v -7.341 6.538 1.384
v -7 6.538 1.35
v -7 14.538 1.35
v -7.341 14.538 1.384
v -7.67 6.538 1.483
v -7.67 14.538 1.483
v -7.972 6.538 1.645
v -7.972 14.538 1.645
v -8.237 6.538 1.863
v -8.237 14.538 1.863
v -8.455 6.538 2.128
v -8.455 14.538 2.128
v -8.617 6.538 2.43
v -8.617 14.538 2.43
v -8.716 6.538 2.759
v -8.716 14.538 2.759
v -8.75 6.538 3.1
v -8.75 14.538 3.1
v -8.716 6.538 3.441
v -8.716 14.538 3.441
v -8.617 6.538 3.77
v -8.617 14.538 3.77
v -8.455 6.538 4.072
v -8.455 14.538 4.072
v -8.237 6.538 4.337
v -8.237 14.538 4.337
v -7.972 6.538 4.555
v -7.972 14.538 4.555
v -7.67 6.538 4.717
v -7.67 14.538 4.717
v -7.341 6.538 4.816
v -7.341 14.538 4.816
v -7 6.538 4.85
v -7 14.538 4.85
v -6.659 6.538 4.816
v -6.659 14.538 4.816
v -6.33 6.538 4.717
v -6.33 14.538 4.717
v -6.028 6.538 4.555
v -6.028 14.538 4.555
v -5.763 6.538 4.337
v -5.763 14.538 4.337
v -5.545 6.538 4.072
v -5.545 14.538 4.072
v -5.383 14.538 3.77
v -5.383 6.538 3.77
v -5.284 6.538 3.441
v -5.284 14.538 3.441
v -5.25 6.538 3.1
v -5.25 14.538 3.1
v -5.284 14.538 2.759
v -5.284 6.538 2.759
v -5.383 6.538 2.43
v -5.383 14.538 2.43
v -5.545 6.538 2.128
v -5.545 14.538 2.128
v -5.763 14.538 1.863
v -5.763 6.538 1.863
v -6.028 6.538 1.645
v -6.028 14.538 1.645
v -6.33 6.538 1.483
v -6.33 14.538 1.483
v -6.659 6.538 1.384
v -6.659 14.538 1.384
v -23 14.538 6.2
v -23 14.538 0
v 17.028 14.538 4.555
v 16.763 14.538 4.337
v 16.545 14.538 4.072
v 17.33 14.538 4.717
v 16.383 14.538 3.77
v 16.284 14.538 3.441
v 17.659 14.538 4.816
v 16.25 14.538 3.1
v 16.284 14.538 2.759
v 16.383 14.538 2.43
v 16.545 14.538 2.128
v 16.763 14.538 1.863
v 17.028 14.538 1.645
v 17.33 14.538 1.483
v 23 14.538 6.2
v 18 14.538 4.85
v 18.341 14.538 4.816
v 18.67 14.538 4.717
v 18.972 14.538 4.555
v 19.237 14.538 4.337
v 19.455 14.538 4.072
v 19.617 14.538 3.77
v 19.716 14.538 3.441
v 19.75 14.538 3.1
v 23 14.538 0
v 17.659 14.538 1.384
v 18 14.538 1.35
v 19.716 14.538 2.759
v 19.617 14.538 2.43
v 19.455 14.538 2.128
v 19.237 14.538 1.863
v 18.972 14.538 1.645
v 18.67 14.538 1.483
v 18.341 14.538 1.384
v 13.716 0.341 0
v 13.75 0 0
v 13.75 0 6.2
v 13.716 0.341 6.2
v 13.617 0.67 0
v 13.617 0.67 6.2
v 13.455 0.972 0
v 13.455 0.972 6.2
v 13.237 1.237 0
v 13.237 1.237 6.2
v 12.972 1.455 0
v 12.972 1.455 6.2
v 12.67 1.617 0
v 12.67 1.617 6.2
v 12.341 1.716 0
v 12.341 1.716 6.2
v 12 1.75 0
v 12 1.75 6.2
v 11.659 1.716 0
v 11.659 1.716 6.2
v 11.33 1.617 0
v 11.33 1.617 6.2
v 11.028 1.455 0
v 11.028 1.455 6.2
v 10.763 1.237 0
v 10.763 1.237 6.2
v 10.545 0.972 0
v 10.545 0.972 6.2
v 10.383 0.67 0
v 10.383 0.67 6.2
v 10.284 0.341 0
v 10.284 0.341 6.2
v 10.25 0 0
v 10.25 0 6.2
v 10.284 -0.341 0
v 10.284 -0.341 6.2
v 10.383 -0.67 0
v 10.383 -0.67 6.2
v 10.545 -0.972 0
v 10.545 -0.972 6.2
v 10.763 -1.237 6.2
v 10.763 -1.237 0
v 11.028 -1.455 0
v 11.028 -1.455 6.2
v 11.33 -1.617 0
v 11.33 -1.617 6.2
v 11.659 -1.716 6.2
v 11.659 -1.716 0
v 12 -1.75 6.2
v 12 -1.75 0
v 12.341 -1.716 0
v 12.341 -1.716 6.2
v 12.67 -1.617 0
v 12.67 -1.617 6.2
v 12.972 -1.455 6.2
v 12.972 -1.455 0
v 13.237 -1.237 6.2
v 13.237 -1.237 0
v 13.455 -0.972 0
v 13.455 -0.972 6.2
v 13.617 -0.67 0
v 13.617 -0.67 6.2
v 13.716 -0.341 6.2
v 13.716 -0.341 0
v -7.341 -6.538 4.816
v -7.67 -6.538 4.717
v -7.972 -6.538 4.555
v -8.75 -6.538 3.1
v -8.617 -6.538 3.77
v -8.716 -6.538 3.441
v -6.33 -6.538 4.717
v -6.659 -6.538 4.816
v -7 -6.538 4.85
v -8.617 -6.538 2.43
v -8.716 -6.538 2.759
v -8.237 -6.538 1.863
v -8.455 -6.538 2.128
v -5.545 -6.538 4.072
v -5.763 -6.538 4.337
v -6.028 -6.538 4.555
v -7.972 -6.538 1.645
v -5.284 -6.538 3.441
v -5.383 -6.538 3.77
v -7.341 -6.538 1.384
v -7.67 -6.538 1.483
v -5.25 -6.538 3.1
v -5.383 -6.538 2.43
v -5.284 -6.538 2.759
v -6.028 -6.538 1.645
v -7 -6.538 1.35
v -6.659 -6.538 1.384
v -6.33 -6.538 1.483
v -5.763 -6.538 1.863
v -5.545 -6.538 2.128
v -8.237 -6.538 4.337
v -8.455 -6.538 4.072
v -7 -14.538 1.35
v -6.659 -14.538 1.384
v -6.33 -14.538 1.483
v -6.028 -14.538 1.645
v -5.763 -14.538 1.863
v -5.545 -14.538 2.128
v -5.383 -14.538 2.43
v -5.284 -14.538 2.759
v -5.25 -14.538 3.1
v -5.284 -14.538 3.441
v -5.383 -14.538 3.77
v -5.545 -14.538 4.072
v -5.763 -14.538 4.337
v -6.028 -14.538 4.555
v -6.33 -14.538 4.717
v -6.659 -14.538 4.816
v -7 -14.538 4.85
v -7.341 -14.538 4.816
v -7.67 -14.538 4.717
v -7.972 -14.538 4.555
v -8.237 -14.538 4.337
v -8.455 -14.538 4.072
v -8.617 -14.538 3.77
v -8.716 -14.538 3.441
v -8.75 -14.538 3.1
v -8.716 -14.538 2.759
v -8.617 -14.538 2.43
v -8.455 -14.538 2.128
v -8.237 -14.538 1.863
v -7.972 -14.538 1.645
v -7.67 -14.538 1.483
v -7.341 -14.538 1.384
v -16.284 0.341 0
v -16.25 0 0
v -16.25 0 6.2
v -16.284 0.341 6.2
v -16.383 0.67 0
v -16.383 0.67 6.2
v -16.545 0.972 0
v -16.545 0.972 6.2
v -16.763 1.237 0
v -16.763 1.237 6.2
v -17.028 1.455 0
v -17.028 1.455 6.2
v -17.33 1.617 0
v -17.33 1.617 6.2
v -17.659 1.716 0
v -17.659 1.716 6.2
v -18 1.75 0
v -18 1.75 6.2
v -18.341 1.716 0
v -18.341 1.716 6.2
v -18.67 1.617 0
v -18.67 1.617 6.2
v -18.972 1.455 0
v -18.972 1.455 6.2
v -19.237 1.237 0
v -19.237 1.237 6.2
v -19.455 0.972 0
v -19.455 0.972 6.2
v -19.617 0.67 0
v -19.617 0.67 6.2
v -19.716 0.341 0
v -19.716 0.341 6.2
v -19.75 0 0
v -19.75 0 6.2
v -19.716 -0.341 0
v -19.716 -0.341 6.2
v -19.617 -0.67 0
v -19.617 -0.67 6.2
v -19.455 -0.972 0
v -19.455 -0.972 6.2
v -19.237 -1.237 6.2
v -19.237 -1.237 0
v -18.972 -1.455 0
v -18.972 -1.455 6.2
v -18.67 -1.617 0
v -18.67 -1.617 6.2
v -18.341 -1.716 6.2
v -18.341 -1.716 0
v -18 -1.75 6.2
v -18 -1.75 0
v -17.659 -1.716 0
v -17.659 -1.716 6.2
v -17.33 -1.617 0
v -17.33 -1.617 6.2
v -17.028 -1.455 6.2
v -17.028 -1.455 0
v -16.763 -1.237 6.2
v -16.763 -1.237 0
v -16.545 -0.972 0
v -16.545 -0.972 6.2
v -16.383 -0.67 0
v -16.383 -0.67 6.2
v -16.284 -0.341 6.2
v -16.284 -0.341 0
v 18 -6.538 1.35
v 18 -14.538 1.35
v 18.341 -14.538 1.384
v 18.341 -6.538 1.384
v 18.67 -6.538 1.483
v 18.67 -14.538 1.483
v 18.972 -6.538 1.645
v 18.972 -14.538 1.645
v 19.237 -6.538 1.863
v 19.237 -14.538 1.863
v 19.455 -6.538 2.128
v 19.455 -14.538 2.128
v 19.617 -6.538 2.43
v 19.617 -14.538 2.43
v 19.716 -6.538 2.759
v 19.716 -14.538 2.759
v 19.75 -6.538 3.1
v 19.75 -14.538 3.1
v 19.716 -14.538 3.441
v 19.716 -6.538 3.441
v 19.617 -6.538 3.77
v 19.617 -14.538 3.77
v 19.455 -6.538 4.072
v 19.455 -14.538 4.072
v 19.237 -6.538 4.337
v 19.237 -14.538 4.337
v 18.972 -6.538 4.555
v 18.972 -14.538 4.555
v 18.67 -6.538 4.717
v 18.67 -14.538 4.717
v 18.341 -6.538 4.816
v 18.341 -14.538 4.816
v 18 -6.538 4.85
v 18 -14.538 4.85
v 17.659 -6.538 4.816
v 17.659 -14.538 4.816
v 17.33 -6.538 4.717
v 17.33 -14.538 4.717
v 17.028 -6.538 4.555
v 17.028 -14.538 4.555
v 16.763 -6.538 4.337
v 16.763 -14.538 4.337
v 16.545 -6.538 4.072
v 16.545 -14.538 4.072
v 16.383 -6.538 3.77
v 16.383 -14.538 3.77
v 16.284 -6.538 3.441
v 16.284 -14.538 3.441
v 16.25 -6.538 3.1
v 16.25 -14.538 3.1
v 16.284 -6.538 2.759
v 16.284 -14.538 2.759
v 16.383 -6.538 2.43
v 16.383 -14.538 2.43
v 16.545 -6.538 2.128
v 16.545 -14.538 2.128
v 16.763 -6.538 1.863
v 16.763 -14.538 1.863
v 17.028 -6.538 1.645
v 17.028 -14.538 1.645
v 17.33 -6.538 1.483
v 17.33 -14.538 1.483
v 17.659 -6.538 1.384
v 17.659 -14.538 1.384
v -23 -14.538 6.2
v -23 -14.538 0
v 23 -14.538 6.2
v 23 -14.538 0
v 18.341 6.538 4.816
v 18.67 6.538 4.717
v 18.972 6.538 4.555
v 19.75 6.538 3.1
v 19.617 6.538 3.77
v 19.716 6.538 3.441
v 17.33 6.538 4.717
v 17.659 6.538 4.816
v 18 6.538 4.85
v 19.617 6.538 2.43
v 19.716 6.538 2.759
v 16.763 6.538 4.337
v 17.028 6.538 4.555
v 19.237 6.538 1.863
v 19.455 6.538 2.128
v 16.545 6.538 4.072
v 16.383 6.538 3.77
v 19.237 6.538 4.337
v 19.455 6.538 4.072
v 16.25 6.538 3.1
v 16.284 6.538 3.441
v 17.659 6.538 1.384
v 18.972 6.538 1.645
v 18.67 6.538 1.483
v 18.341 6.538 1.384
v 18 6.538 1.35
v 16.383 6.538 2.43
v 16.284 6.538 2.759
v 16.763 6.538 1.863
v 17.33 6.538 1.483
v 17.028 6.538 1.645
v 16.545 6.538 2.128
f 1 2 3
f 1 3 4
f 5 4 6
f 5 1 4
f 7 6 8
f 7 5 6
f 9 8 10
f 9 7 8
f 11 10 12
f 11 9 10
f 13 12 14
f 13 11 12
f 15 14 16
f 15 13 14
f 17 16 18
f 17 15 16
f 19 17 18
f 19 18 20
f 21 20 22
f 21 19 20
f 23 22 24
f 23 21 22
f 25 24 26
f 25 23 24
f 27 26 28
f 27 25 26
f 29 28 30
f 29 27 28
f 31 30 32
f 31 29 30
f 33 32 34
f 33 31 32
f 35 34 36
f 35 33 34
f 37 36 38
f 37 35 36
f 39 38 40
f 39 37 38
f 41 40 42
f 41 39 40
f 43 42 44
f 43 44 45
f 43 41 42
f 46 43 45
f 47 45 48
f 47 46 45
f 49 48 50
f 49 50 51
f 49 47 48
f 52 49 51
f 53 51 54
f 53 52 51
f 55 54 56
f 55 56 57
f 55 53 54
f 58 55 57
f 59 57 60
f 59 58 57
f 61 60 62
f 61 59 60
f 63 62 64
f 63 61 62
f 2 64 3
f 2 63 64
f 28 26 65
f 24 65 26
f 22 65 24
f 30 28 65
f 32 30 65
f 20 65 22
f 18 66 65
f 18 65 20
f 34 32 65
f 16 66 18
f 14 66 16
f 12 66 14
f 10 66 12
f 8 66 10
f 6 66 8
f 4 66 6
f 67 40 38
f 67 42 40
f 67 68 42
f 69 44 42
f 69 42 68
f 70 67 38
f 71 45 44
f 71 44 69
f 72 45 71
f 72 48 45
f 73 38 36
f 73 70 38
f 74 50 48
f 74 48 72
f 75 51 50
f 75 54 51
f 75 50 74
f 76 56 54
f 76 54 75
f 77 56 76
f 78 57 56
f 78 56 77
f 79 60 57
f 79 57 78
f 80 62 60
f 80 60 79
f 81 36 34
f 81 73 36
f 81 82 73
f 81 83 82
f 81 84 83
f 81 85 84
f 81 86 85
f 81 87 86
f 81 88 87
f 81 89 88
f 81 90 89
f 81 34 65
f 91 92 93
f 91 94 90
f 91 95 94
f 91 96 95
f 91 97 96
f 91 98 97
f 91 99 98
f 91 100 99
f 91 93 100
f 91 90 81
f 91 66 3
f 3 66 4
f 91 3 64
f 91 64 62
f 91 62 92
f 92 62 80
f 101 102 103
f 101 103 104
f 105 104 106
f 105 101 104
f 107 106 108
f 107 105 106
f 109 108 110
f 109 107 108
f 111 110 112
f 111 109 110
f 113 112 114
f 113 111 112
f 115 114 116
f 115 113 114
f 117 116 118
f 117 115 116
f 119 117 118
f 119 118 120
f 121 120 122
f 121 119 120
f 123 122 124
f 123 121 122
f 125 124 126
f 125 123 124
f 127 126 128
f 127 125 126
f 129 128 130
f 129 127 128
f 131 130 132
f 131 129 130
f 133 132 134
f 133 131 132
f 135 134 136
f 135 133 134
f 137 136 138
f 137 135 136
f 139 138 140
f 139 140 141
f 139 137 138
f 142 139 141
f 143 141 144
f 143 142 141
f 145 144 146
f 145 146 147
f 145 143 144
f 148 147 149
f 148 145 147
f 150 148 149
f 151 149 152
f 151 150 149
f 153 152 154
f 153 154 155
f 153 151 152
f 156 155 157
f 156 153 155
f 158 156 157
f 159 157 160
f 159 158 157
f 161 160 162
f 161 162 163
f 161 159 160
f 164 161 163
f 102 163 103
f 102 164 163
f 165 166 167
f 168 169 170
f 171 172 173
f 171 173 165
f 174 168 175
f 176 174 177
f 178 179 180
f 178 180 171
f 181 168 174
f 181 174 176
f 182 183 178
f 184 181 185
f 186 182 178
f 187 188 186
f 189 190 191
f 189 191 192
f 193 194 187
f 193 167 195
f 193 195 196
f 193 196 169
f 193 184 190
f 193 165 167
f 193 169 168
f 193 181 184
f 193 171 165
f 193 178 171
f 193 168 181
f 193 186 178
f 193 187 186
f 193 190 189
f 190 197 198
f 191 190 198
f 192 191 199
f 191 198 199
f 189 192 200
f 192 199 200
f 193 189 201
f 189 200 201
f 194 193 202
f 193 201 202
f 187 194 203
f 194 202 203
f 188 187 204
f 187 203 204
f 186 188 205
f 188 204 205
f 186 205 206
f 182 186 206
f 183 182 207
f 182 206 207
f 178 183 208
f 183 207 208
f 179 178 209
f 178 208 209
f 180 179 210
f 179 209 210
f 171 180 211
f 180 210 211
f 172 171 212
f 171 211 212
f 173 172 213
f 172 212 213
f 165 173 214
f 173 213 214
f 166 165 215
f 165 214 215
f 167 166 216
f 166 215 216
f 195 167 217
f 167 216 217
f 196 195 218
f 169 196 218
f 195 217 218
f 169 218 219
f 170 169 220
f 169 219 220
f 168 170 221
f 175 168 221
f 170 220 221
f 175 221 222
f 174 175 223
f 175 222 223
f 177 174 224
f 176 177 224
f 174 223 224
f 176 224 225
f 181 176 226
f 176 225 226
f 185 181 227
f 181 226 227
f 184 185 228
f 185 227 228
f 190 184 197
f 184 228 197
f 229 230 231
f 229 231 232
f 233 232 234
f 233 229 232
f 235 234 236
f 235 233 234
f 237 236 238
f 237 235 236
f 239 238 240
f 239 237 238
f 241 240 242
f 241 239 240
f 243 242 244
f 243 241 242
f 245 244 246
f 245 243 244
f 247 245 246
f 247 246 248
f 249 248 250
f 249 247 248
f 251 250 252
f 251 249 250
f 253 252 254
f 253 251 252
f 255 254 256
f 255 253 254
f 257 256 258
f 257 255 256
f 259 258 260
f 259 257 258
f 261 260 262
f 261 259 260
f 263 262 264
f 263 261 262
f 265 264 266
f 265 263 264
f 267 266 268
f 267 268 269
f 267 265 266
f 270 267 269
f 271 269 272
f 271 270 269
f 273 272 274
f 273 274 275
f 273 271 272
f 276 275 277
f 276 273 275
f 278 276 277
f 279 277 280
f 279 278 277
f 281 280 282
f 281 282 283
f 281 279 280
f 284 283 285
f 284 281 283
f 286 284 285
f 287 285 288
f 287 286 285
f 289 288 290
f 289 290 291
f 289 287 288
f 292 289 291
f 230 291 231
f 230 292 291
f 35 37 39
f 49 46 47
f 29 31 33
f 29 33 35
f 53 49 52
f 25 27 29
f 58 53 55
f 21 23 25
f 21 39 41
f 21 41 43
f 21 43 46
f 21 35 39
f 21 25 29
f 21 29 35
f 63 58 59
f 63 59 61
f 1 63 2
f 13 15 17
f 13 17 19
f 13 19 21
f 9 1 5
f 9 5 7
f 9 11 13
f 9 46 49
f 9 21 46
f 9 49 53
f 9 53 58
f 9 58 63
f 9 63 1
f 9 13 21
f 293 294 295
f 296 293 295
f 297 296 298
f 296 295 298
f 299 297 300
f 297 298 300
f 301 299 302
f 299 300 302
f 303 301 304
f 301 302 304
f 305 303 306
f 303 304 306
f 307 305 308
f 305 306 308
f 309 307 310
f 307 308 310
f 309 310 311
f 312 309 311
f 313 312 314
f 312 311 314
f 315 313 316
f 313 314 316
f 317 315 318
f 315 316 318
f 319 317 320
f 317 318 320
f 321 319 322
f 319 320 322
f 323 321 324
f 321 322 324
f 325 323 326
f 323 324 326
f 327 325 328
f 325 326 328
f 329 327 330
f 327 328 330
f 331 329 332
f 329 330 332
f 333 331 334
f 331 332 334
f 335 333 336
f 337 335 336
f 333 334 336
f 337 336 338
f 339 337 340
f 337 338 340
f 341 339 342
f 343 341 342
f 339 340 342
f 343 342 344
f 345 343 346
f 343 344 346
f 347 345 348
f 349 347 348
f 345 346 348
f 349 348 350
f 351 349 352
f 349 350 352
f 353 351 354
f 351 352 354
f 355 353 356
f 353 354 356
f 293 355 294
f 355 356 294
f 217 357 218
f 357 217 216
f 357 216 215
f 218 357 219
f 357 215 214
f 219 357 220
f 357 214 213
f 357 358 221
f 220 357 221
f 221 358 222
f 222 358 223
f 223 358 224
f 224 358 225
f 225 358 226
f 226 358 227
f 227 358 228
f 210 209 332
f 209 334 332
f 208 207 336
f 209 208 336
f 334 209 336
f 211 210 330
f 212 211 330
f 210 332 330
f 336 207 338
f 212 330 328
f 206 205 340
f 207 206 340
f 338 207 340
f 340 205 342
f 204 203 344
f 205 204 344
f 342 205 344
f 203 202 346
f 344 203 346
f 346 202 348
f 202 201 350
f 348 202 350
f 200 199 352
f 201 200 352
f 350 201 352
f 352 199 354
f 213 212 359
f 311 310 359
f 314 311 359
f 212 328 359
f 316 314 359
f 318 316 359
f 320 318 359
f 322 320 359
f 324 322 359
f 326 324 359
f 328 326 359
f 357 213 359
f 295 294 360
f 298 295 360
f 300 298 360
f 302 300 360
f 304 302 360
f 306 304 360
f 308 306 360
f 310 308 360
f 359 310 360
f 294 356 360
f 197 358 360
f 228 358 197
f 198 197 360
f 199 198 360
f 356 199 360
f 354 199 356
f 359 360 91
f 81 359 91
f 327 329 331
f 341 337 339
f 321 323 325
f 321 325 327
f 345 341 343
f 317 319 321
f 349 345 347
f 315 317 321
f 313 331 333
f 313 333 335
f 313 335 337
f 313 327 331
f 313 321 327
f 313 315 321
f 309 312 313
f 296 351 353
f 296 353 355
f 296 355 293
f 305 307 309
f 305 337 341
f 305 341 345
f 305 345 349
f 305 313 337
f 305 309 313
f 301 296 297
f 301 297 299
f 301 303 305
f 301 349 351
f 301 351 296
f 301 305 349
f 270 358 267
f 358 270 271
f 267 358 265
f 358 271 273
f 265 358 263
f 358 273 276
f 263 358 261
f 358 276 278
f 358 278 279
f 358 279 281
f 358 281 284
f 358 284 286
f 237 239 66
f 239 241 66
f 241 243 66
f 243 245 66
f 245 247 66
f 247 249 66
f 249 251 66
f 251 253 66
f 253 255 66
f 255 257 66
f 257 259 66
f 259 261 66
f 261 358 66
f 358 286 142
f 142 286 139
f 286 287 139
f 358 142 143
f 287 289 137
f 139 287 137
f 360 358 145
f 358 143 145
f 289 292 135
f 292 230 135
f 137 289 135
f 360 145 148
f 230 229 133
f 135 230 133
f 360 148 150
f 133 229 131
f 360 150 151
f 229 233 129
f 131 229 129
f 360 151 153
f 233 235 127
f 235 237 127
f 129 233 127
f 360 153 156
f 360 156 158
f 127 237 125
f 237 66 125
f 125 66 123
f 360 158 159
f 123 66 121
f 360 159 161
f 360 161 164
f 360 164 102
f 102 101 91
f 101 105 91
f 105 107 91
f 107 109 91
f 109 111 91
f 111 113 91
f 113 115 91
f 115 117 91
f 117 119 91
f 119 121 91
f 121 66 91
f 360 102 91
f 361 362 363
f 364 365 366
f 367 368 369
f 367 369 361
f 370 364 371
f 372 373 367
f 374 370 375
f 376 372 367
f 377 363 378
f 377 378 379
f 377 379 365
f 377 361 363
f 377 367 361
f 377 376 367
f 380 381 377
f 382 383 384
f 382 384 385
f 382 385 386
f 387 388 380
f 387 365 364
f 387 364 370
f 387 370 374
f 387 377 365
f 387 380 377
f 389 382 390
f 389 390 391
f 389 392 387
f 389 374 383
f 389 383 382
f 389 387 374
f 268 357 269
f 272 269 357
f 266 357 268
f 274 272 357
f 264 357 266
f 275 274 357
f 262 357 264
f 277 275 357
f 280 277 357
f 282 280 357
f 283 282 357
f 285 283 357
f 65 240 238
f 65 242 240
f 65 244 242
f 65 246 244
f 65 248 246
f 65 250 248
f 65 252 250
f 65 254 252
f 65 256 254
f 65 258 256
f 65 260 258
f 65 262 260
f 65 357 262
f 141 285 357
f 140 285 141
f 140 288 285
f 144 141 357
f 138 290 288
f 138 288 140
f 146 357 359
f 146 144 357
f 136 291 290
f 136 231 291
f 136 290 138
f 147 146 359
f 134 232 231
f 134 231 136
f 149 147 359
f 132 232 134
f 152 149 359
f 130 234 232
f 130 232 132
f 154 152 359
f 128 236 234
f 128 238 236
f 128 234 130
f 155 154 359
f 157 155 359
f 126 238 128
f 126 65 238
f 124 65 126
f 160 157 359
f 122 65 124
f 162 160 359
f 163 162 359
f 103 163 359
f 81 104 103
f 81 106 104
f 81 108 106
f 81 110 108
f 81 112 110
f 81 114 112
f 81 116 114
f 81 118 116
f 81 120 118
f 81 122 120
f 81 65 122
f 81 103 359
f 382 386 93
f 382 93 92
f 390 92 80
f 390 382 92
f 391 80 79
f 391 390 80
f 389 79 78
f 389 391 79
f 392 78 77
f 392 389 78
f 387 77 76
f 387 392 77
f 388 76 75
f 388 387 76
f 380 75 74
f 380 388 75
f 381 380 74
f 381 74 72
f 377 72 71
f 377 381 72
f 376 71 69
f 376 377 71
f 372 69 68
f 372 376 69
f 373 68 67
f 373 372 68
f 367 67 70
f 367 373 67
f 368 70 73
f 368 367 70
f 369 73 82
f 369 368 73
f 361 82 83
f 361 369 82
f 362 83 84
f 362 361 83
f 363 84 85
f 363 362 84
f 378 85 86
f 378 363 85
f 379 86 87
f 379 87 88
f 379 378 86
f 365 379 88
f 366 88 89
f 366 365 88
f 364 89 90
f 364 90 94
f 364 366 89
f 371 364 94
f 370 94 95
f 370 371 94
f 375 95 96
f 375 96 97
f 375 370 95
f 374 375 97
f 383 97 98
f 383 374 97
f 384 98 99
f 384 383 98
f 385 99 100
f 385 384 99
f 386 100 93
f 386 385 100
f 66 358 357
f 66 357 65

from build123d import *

# Parameters (mm, degrees)
SKETCH1_W         = 46
SKETCH1_H         = 29.075
EXTRUDE_1_4_DEPTH = 6.2
SKETCH2_R         = 1.75
M4_DRILL_DEPTH    = 6.2
SKETCH3_R         = 1.75
M4_DRILL2_DEPTH   = 8
M4_DRILL3_START   = -8
SKETCH4_R         = 1.75
M4_DRILL3_DEPTH   = 8


with BuildPart() as part:
    # Sketch1 → 1/4 (new body)
    with BuildSketch(Plane.XY):
        Rectangle(SKETCH1_W, SKETCH1_H)
    extrude(amount=EXTRUDE_1_4_DEPTH)

    # Sketch2 → M4_DRILL (cut)
    with BuildSketch(Plane.XY):
        with Locations((-18, 0)):
            Circle(SKETCH2_R)
        with Locations((12, 0)):
            Circle(SKETCH2_R)
    extrude(amount=M4_DRILL_DEPTH, mode=Mode.SUBTRACT)

    # Sketch3 → M4_DRILL2 (cut)
    with BuildSketch(Plane.XZ.offset(14.5375)):
        with Locations(Location((-7, 3.1, 0), (0, 0, 270))):
            Circle(SKETCH3_R)
        with Locations(Location((18, 3.1, 0), (0, 0, 270))):
            Circle(SKETCH3_R)
    extrude(amount=-M4_DRILL2_DEPTH, mode=Mode.SUBTRACT)

    # Sketch4 → M4_DRILL3 (cut)
    with BuildSketch(Plane(origin=(0, 14.5375, 0), x_dir=(1, 0, 0), z_dir=(0, 1, 0)).offset(M4_DRILL3_START)):
        with Locations(Location((18, -3.1, 0), (0, 0, 90))):
            Circle(SKETCH4_R)
        with Locations(Location((-7, -3.1, 0), (0, 0, 90))):
            Circle(SKETCH4_R)
    extrude(amount=M4_DRILL3_DEPTH, mode=Mode.SUBTRACT)


solid = part.part
